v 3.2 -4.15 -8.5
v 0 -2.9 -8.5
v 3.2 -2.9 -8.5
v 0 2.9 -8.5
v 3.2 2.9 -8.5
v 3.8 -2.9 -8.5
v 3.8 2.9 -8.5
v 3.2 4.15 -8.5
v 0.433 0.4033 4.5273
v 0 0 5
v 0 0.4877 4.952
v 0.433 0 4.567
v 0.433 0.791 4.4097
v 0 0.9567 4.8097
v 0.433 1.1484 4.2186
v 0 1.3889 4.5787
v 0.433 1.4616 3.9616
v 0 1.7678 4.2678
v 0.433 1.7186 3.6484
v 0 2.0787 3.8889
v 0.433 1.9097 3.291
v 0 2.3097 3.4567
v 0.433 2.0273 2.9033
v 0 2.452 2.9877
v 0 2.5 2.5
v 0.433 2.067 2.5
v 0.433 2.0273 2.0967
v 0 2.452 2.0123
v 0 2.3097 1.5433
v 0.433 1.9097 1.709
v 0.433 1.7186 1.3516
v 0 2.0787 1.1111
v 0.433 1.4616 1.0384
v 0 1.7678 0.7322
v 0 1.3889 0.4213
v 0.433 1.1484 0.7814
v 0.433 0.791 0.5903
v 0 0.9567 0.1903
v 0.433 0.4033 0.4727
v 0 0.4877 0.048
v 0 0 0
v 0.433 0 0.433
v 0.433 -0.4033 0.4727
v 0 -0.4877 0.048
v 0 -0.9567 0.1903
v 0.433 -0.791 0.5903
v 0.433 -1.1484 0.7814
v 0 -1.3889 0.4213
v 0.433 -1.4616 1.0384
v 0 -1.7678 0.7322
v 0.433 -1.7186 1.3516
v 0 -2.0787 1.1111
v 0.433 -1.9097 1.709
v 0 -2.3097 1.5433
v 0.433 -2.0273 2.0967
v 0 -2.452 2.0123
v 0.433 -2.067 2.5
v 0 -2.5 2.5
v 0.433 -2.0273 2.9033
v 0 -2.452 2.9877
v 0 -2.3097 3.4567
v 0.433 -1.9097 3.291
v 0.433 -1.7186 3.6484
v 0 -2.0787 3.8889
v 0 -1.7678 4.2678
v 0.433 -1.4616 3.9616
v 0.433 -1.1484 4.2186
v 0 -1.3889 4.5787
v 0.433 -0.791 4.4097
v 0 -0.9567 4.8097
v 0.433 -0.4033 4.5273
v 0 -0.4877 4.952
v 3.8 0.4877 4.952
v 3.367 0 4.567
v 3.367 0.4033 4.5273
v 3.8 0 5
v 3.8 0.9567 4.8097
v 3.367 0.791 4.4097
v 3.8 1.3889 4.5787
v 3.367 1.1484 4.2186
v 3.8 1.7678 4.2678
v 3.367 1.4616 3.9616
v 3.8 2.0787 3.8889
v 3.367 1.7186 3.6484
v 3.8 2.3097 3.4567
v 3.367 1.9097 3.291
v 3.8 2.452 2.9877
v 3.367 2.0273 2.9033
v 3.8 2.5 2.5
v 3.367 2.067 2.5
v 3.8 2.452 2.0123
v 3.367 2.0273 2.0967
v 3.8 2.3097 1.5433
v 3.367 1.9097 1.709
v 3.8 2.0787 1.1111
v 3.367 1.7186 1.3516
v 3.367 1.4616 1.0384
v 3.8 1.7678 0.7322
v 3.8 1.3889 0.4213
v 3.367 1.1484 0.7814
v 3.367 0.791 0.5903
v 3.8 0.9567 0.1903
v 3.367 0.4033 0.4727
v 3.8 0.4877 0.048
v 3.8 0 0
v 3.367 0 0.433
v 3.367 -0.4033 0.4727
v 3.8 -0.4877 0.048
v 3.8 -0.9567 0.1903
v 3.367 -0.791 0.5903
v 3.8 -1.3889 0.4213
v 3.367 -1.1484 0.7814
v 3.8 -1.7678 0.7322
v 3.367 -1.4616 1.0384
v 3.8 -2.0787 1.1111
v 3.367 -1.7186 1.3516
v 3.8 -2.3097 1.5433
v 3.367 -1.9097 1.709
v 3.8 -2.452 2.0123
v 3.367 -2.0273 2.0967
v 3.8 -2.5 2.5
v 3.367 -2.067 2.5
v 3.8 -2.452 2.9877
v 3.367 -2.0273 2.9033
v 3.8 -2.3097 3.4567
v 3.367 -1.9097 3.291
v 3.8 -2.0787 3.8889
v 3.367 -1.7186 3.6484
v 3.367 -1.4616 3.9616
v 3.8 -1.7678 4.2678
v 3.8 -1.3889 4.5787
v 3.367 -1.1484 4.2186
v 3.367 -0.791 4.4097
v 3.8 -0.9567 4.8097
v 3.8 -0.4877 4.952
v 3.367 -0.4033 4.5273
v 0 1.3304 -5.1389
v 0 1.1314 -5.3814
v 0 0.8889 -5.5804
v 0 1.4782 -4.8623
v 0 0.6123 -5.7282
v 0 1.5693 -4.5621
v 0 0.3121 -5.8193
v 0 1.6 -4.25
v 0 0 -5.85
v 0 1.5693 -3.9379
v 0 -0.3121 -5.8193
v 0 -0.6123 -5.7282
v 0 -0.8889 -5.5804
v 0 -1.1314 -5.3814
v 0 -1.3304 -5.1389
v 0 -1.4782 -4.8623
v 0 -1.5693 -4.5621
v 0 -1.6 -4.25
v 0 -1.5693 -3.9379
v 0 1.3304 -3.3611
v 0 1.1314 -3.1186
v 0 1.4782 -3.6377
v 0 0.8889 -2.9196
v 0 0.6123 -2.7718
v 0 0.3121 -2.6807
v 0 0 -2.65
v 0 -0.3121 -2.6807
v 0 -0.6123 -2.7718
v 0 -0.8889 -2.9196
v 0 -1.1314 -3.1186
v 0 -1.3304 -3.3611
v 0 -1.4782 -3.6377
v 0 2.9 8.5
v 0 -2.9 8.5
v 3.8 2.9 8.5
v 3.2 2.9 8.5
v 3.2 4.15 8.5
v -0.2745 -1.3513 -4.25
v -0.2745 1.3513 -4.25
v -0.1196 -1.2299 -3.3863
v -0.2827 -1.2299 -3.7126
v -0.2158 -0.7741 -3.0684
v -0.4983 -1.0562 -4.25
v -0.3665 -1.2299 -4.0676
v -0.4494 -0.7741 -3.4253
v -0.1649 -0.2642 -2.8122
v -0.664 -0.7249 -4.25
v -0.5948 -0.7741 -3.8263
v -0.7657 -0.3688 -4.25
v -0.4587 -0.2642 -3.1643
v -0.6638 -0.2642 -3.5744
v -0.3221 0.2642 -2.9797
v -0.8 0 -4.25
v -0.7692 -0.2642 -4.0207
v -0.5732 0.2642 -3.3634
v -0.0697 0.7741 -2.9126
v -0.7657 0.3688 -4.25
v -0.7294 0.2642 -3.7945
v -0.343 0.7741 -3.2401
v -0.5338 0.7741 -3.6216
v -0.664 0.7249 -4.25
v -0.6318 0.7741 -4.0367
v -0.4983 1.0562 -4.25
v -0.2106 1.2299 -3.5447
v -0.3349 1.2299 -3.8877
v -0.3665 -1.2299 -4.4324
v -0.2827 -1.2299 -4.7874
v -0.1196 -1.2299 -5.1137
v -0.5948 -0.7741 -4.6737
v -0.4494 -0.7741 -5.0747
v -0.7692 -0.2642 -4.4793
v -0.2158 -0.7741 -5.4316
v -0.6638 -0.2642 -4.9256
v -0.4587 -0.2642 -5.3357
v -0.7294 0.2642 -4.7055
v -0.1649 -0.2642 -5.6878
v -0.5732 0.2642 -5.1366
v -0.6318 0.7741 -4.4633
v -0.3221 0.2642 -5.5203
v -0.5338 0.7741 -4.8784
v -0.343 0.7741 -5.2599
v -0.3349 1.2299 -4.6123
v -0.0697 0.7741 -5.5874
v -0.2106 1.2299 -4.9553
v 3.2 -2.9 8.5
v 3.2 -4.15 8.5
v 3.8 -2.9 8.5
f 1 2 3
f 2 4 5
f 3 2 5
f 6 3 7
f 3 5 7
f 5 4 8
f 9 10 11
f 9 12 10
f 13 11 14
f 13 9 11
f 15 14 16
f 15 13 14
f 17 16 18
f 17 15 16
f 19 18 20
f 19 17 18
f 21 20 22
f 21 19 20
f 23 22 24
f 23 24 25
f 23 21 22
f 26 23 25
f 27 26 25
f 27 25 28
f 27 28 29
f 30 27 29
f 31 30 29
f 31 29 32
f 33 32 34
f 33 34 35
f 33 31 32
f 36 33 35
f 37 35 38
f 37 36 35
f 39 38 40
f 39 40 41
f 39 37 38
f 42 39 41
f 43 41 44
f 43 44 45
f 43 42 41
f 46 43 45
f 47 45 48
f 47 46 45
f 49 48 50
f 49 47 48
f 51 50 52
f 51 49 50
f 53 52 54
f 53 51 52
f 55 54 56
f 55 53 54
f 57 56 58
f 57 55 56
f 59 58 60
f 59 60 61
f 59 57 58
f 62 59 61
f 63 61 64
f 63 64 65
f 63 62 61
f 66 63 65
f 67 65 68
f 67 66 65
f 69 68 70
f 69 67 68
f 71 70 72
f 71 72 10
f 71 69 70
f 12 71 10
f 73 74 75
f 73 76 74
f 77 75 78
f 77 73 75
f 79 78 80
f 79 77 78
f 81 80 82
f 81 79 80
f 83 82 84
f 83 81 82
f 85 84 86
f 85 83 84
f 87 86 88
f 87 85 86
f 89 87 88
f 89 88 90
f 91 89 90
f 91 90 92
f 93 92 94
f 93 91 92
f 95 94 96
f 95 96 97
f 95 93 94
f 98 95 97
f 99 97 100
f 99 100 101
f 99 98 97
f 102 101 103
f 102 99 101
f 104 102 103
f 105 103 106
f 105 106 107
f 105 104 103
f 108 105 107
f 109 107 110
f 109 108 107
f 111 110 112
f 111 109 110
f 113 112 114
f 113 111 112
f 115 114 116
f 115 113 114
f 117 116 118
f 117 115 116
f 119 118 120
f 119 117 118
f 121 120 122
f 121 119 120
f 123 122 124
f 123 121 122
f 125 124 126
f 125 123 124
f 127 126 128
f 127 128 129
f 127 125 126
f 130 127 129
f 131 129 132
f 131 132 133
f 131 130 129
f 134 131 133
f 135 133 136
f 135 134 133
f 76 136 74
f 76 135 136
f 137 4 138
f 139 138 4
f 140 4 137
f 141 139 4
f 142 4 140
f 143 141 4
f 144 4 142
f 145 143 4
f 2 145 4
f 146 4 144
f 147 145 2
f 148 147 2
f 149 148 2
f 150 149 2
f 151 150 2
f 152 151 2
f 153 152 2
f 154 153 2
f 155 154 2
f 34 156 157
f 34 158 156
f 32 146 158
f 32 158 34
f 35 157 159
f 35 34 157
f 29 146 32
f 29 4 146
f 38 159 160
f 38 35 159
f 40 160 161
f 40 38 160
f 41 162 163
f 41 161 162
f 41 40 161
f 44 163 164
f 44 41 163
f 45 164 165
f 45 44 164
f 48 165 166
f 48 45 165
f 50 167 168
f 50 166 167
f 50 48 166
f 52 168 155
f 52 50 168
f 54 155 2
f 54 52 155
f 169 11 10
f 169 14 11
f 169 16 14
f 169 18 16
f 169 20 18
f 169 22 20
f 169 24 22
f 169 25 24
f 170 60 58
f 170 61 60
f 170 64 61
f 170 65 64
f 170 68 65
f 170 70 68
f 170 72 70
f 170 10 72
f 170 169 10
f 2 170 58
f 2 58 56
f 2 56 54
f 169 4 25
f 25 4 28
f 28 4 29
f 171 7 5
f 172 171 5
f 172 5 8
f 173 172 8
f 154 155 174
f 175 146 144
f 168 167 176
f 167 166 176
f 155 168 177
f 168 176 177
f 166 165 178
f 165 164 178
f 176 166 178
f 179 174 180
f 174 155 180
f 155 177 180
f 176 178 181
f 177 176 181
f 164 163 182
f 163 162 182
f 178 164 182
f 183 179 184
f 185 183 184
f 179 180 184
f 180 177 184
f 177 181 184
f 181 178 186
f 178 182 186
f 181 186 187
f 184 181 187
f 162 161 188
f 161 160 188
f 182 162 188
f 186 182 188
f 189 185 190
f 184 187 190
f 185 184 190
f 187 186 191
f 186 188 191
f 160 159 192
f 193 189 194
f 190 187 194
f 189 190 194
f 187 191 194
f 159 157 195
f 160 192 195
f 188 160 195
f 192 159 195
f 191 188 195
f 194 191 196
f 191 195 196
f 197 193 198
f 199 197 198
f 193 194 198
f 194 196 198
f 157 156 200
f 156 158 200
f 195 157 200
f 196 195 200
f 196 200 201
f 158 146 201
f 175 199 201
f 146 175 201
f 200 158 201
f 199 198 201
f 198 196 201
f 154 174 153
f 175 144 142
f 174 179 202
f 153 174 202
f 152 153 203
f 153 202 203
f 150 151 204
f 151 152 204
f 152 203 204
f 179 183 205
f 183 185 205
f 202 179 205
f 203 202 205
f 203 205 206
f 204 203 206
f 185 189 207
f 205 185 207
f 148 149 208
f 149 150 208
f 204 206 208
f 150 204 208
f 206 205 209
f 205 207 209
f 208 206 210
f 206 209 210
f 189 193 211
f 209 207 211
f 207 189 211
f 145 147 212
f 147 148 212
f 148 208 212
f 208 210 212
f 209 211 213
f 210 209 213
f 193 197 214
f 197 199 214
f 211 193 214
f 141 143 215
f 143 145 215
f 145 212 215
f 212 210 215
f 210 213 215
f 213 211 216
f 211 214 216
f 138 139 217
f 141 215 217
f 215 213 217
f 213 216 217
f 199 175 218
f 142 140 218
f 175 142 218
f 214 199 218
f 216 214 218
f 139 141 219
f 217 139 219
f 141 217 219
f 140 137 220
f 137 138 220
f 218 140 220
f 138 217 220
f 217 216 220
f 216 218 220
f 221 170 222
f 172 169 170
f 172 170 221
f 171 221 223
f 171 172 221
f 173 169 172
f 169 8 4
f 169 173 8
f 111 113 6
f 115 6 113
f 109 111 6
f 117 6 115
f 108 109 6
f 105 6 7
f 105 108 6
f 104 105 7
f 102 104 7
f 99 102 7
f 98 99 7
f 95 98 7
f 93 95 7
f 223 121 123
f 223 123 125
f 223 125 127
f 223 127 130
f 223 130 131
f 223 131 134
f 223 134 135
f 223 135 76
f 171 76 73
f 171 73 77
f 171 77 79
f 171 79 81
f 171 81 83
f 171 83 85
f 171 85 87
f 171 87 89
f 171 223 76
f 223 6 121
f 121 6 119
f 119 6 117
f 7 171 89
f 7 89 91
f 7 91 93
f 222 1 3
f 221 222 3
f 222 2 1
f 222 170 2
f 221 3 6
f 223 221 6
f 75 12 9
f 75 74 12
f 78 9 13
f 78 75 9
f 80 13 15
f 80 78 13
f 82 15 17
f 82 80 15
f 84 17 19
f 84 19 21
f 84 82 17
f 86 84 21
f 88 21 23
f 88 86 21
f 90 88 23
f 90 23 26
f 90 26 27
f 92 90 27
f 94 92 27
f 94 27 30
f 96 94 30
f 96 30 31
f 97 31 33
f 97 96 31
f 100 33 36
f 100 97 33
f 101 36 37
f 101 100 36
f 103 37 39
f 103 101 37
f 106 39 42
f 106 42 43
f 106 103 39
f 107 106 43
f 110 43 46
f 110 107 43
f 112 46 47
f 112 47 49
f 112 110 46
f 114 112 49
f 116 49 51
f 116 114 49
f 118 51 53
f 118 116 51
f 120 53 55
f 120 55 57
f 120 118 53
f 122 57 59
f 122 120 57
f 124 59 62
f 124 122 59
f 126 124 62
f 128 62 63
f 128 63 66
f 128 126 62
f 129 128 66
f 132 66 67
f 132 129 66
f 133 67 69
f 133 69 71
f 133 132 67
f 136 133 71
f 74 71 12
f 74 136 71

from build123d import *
from build123d.topology import SkipClean

# Parameters (mm, degrees)
EXTRUDE_1_DEPTH      = 8.5
EXTRUDE_1_DEPTH_BACK = 8.5


with BuildPart() as part:
    # ｽｹｯﾁ1 → ﾎﾞｽ - 押し出し1 (new, two sides: drawn at the far end of the back side and taken through both)
    with BuildSketch(Plane.XY.offset(-EXTRUDE_1_DEPTH_BACK)):
        Polygon((0, -2.9), (3.2, -4.15), (3.2, -2.9), (3.8, -2.9), (3.8, 2.9), (3.2, 2.9), (3.2, 4.15), (0, 2.9), align=None)
    extrude(amount=EXTRUDE_1_DEPTH + EXTRUDE_1_DEPTH_BACK)

    # ｽｹｯﾁ2 → ｶｯﾄ - 回転1 (revolve, cut)
    with BuildSketch(Plane.XY.offset(2.5)):
        Polygon((0, 0), (0, 2.5), (0.433, 2.067), (3.367, 2.067), (3.8, 2.5), (3.8, 0), align=None)
    revolve(axis=Axis((3.8, 0, 2.5), (-1, 0, 0)), mode=Mode.SUBTRACT)

    # ｽｹｯﾁ3 → 回転1 (revolve)
    with SkipClean():  # the faces are left unmerged after this step: merging them gives an invalid solid
        with BuildSketch(Plane.XY.offset(-4.25)):
            with BuildLine():
                Line((1.2, 2), (1.2, -2))
                ThreePointArc((1.2, -2), (-0.8, 0), (1.2, 2))
            make_face()
        revolve(axis=Axis((1.2, 3.2, -4.25), (0, -1, 0)))


solid = part.part
